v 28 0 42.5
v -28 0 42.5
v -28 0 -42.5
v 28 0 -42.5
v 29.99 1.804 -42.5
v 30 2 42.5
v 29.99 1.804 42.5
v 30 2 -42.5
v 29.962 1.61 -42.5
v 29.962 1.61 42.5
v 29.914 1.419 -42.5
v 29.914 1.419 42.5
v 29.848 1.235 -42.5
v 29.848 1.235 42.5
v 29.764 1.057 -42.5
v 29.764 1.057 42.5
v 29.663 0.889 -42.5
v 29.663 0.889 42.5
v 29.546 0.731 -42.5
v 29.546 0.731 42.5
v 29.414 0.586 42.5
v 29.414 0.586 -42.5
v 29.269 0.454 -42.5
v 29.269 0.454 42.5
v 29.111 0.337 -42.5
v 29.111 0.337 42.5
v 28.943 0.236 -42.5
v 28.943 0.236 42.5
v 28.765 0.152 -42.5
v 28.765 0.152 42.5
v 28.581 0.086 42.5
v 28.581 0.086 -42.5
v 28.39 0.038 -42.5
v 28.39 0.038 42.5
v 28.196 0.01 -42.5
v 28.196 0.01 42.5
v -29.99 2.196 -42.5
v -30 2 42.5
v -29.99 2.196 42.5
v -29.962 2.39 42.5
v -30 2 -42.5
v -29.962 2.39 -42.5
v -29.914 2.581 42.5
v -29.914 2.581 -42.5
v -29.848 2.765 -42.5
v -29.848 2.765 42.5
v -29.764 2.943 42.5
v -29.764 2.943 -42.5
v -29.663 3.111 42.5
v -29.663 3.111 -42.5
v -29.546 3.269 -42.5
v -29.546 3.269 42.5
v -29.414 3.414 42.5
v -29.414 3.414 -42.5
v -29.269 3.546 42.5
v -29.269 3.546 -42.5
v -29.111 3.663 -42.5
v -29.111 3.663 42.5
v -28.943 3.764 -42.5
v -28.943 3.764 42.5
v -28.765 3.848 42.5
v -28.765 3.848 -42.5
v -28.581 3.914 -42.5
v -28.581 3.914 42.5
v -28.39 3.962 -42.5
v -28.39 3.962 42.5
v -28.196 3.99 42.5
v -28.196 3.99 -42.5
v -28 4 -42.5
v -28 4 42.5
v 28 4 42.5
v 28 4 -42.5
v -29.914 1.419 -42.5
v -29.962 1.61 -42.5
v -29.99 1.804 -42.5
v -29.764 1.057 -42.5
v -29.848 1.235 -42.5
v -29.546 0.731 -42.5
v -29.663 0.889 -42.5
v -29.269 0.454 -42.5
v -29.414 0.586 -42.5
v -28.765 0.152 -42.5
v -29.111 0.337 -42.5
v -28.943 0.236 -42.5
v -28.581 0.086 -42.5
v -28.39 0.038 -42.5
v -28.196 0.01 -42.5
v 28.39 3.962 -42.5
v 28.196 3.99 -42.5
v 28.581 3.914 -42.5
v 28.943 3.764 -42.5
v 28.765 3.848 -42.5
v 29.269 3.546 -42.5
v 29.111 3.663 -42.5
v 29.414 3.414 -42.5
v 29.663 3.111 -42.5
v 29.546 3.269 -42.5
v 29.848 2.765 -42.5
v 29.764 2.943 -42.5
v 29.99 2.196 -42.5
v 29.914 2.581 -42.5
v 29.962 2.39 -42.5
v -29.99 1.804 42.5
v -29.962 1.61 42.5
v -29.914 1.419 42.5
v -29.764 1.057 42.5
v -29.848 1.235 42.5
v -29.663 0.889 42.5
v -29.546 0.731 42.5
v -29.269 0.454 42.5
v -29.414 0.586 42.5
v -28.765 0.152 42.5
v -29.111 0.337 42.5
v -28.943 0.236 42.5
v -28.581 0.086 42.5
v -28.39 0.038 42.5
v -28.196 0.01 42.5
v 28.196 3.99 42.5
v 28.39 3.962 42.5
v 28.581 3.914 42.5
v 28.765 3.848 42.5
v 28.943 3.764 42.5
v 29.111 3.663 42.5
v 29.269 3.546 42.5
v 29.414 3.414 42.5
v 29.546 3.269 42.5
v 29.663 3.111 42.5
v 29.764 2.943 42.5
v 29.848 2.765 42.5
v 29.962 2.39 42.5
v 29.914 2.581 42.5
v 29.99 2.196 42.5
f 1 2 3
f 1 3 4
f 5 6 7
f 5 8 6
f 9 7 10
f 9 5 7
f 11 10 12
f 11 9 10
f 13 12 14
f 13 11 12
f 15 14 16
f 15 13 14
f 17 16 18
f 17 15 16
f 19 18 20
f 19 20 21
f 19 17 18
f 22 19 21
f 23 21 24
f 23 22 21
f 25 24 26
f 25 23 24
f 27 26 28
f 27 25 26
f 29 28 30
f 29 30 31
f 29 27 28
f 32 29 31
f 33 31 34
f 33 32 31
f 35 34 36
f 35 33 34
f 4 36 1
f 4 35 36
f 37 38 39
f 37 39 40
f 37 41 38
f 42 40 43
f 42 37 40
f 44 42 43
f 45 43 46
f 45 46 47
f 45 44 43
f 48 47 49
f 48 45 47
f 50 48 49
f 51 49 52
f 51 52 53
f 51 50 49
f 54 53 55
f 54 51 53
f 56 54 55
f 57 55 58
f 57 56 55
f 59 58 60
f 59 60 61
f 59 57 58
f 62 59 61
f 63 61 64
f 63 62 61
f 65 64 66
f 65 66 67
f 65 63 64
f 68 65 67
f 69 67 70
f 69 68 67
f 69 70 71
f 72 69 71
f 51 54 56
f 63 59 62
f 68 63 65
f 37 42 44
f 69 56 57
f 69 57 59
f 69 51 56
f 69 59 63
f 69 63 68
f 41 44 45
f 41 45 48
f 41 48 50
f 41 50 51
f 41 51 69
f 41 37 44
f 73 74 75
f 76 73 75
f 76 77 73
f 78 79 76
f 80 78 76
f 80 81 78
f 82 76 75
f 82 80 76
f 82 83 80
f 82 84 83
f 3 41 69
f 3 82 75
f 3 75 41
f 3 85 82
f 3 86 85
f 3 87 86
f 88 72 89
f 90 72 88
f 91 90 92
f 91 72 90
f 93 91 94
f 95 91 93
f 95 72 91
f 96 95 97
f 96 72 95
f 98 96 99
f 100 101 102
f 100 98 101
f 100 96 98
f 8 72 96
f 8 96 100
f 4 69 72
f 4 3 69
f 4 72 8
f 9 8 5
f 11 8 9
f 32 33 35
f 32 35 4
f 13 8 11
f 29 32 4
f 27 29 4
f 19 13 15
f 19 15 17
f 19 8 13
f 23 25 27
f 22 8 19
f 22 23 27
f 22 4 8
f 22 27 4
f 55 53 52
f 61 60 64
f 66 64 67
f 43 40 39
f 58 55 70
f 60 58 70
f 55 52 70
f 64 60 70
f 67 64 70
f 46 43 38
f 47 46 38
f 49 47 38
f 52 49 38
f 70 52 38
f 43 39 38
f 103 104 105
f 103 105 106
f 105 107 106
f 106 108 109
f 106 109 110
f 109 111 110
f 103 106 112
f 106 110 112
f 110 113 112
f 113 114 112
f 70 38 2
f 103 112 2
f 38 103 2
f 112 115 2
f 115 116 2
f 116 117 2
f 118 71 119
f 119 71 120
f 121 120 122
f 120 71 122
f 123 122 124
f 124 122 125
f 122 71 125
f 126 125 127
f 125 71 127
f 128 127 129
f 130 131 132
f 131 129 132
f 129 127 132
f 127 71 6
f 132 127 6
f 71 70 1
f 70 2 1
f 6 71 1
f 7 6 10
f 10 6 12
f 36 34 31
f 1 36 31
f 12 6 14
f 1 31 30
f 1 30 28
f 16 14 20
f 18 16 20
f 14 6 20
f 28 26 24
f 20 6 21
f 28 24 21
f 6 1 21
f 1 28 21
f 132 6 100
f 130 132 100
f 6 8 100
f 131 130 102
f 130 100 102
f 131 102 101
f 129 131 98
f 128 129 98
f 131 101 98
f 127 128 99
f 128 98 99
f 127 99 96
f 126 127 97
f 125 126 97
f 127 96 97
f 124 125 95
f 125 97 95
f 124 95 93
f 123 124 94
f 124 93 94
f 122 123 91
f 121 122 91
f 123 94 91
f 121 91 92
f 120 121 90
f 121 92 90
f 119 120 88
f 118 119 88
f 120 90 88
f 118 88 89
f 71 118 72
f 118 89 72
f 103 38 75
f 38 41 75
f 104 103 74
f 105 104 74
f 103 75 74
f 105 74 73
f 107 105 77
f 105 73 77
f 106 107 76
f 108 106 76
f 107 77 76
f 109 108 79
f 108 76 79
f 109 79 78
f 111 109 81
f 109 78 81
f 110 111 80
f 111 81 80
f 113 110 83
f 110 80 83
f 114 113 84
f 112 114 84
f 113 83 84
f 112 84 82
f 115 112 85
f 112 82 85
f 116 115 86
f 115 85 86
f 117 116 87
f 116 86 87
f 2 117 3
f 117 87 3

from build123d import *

# Parameters (mm, degrees)
SKETCH2_W           = 60
SKETCH2_H           = 85
BOSS_EXTRUDE1_DEPTH = 4
FILLET1_R           = 2


with BuildPart() as part:
    # Sketch2 → Boss-Extrude1 (new body)
    with BuildSketch(Plane(origin=(0, 0, 0), x_dir=(1, 0, 0), z_dir=(0, 1, 0))):
        Rectangle(SKETCH2_W, SKETCH2_H)
    extrude(amount=BOSS_EXTRUDE1_DEPTH)

    # Fillet1
    fillet1_edges = [part.edges().sort_by_distance(p)[0] for p in [
        (30, 0, 0),
        (-30, 0, 0),
        (-30, 4, 0),
        (30, 4, 0),
    ]]
    fillet(fillet1_edges, radius=FILLET1_R - 0.0001)  # a hair under: the kernel refuses the full size


solid = part.part
